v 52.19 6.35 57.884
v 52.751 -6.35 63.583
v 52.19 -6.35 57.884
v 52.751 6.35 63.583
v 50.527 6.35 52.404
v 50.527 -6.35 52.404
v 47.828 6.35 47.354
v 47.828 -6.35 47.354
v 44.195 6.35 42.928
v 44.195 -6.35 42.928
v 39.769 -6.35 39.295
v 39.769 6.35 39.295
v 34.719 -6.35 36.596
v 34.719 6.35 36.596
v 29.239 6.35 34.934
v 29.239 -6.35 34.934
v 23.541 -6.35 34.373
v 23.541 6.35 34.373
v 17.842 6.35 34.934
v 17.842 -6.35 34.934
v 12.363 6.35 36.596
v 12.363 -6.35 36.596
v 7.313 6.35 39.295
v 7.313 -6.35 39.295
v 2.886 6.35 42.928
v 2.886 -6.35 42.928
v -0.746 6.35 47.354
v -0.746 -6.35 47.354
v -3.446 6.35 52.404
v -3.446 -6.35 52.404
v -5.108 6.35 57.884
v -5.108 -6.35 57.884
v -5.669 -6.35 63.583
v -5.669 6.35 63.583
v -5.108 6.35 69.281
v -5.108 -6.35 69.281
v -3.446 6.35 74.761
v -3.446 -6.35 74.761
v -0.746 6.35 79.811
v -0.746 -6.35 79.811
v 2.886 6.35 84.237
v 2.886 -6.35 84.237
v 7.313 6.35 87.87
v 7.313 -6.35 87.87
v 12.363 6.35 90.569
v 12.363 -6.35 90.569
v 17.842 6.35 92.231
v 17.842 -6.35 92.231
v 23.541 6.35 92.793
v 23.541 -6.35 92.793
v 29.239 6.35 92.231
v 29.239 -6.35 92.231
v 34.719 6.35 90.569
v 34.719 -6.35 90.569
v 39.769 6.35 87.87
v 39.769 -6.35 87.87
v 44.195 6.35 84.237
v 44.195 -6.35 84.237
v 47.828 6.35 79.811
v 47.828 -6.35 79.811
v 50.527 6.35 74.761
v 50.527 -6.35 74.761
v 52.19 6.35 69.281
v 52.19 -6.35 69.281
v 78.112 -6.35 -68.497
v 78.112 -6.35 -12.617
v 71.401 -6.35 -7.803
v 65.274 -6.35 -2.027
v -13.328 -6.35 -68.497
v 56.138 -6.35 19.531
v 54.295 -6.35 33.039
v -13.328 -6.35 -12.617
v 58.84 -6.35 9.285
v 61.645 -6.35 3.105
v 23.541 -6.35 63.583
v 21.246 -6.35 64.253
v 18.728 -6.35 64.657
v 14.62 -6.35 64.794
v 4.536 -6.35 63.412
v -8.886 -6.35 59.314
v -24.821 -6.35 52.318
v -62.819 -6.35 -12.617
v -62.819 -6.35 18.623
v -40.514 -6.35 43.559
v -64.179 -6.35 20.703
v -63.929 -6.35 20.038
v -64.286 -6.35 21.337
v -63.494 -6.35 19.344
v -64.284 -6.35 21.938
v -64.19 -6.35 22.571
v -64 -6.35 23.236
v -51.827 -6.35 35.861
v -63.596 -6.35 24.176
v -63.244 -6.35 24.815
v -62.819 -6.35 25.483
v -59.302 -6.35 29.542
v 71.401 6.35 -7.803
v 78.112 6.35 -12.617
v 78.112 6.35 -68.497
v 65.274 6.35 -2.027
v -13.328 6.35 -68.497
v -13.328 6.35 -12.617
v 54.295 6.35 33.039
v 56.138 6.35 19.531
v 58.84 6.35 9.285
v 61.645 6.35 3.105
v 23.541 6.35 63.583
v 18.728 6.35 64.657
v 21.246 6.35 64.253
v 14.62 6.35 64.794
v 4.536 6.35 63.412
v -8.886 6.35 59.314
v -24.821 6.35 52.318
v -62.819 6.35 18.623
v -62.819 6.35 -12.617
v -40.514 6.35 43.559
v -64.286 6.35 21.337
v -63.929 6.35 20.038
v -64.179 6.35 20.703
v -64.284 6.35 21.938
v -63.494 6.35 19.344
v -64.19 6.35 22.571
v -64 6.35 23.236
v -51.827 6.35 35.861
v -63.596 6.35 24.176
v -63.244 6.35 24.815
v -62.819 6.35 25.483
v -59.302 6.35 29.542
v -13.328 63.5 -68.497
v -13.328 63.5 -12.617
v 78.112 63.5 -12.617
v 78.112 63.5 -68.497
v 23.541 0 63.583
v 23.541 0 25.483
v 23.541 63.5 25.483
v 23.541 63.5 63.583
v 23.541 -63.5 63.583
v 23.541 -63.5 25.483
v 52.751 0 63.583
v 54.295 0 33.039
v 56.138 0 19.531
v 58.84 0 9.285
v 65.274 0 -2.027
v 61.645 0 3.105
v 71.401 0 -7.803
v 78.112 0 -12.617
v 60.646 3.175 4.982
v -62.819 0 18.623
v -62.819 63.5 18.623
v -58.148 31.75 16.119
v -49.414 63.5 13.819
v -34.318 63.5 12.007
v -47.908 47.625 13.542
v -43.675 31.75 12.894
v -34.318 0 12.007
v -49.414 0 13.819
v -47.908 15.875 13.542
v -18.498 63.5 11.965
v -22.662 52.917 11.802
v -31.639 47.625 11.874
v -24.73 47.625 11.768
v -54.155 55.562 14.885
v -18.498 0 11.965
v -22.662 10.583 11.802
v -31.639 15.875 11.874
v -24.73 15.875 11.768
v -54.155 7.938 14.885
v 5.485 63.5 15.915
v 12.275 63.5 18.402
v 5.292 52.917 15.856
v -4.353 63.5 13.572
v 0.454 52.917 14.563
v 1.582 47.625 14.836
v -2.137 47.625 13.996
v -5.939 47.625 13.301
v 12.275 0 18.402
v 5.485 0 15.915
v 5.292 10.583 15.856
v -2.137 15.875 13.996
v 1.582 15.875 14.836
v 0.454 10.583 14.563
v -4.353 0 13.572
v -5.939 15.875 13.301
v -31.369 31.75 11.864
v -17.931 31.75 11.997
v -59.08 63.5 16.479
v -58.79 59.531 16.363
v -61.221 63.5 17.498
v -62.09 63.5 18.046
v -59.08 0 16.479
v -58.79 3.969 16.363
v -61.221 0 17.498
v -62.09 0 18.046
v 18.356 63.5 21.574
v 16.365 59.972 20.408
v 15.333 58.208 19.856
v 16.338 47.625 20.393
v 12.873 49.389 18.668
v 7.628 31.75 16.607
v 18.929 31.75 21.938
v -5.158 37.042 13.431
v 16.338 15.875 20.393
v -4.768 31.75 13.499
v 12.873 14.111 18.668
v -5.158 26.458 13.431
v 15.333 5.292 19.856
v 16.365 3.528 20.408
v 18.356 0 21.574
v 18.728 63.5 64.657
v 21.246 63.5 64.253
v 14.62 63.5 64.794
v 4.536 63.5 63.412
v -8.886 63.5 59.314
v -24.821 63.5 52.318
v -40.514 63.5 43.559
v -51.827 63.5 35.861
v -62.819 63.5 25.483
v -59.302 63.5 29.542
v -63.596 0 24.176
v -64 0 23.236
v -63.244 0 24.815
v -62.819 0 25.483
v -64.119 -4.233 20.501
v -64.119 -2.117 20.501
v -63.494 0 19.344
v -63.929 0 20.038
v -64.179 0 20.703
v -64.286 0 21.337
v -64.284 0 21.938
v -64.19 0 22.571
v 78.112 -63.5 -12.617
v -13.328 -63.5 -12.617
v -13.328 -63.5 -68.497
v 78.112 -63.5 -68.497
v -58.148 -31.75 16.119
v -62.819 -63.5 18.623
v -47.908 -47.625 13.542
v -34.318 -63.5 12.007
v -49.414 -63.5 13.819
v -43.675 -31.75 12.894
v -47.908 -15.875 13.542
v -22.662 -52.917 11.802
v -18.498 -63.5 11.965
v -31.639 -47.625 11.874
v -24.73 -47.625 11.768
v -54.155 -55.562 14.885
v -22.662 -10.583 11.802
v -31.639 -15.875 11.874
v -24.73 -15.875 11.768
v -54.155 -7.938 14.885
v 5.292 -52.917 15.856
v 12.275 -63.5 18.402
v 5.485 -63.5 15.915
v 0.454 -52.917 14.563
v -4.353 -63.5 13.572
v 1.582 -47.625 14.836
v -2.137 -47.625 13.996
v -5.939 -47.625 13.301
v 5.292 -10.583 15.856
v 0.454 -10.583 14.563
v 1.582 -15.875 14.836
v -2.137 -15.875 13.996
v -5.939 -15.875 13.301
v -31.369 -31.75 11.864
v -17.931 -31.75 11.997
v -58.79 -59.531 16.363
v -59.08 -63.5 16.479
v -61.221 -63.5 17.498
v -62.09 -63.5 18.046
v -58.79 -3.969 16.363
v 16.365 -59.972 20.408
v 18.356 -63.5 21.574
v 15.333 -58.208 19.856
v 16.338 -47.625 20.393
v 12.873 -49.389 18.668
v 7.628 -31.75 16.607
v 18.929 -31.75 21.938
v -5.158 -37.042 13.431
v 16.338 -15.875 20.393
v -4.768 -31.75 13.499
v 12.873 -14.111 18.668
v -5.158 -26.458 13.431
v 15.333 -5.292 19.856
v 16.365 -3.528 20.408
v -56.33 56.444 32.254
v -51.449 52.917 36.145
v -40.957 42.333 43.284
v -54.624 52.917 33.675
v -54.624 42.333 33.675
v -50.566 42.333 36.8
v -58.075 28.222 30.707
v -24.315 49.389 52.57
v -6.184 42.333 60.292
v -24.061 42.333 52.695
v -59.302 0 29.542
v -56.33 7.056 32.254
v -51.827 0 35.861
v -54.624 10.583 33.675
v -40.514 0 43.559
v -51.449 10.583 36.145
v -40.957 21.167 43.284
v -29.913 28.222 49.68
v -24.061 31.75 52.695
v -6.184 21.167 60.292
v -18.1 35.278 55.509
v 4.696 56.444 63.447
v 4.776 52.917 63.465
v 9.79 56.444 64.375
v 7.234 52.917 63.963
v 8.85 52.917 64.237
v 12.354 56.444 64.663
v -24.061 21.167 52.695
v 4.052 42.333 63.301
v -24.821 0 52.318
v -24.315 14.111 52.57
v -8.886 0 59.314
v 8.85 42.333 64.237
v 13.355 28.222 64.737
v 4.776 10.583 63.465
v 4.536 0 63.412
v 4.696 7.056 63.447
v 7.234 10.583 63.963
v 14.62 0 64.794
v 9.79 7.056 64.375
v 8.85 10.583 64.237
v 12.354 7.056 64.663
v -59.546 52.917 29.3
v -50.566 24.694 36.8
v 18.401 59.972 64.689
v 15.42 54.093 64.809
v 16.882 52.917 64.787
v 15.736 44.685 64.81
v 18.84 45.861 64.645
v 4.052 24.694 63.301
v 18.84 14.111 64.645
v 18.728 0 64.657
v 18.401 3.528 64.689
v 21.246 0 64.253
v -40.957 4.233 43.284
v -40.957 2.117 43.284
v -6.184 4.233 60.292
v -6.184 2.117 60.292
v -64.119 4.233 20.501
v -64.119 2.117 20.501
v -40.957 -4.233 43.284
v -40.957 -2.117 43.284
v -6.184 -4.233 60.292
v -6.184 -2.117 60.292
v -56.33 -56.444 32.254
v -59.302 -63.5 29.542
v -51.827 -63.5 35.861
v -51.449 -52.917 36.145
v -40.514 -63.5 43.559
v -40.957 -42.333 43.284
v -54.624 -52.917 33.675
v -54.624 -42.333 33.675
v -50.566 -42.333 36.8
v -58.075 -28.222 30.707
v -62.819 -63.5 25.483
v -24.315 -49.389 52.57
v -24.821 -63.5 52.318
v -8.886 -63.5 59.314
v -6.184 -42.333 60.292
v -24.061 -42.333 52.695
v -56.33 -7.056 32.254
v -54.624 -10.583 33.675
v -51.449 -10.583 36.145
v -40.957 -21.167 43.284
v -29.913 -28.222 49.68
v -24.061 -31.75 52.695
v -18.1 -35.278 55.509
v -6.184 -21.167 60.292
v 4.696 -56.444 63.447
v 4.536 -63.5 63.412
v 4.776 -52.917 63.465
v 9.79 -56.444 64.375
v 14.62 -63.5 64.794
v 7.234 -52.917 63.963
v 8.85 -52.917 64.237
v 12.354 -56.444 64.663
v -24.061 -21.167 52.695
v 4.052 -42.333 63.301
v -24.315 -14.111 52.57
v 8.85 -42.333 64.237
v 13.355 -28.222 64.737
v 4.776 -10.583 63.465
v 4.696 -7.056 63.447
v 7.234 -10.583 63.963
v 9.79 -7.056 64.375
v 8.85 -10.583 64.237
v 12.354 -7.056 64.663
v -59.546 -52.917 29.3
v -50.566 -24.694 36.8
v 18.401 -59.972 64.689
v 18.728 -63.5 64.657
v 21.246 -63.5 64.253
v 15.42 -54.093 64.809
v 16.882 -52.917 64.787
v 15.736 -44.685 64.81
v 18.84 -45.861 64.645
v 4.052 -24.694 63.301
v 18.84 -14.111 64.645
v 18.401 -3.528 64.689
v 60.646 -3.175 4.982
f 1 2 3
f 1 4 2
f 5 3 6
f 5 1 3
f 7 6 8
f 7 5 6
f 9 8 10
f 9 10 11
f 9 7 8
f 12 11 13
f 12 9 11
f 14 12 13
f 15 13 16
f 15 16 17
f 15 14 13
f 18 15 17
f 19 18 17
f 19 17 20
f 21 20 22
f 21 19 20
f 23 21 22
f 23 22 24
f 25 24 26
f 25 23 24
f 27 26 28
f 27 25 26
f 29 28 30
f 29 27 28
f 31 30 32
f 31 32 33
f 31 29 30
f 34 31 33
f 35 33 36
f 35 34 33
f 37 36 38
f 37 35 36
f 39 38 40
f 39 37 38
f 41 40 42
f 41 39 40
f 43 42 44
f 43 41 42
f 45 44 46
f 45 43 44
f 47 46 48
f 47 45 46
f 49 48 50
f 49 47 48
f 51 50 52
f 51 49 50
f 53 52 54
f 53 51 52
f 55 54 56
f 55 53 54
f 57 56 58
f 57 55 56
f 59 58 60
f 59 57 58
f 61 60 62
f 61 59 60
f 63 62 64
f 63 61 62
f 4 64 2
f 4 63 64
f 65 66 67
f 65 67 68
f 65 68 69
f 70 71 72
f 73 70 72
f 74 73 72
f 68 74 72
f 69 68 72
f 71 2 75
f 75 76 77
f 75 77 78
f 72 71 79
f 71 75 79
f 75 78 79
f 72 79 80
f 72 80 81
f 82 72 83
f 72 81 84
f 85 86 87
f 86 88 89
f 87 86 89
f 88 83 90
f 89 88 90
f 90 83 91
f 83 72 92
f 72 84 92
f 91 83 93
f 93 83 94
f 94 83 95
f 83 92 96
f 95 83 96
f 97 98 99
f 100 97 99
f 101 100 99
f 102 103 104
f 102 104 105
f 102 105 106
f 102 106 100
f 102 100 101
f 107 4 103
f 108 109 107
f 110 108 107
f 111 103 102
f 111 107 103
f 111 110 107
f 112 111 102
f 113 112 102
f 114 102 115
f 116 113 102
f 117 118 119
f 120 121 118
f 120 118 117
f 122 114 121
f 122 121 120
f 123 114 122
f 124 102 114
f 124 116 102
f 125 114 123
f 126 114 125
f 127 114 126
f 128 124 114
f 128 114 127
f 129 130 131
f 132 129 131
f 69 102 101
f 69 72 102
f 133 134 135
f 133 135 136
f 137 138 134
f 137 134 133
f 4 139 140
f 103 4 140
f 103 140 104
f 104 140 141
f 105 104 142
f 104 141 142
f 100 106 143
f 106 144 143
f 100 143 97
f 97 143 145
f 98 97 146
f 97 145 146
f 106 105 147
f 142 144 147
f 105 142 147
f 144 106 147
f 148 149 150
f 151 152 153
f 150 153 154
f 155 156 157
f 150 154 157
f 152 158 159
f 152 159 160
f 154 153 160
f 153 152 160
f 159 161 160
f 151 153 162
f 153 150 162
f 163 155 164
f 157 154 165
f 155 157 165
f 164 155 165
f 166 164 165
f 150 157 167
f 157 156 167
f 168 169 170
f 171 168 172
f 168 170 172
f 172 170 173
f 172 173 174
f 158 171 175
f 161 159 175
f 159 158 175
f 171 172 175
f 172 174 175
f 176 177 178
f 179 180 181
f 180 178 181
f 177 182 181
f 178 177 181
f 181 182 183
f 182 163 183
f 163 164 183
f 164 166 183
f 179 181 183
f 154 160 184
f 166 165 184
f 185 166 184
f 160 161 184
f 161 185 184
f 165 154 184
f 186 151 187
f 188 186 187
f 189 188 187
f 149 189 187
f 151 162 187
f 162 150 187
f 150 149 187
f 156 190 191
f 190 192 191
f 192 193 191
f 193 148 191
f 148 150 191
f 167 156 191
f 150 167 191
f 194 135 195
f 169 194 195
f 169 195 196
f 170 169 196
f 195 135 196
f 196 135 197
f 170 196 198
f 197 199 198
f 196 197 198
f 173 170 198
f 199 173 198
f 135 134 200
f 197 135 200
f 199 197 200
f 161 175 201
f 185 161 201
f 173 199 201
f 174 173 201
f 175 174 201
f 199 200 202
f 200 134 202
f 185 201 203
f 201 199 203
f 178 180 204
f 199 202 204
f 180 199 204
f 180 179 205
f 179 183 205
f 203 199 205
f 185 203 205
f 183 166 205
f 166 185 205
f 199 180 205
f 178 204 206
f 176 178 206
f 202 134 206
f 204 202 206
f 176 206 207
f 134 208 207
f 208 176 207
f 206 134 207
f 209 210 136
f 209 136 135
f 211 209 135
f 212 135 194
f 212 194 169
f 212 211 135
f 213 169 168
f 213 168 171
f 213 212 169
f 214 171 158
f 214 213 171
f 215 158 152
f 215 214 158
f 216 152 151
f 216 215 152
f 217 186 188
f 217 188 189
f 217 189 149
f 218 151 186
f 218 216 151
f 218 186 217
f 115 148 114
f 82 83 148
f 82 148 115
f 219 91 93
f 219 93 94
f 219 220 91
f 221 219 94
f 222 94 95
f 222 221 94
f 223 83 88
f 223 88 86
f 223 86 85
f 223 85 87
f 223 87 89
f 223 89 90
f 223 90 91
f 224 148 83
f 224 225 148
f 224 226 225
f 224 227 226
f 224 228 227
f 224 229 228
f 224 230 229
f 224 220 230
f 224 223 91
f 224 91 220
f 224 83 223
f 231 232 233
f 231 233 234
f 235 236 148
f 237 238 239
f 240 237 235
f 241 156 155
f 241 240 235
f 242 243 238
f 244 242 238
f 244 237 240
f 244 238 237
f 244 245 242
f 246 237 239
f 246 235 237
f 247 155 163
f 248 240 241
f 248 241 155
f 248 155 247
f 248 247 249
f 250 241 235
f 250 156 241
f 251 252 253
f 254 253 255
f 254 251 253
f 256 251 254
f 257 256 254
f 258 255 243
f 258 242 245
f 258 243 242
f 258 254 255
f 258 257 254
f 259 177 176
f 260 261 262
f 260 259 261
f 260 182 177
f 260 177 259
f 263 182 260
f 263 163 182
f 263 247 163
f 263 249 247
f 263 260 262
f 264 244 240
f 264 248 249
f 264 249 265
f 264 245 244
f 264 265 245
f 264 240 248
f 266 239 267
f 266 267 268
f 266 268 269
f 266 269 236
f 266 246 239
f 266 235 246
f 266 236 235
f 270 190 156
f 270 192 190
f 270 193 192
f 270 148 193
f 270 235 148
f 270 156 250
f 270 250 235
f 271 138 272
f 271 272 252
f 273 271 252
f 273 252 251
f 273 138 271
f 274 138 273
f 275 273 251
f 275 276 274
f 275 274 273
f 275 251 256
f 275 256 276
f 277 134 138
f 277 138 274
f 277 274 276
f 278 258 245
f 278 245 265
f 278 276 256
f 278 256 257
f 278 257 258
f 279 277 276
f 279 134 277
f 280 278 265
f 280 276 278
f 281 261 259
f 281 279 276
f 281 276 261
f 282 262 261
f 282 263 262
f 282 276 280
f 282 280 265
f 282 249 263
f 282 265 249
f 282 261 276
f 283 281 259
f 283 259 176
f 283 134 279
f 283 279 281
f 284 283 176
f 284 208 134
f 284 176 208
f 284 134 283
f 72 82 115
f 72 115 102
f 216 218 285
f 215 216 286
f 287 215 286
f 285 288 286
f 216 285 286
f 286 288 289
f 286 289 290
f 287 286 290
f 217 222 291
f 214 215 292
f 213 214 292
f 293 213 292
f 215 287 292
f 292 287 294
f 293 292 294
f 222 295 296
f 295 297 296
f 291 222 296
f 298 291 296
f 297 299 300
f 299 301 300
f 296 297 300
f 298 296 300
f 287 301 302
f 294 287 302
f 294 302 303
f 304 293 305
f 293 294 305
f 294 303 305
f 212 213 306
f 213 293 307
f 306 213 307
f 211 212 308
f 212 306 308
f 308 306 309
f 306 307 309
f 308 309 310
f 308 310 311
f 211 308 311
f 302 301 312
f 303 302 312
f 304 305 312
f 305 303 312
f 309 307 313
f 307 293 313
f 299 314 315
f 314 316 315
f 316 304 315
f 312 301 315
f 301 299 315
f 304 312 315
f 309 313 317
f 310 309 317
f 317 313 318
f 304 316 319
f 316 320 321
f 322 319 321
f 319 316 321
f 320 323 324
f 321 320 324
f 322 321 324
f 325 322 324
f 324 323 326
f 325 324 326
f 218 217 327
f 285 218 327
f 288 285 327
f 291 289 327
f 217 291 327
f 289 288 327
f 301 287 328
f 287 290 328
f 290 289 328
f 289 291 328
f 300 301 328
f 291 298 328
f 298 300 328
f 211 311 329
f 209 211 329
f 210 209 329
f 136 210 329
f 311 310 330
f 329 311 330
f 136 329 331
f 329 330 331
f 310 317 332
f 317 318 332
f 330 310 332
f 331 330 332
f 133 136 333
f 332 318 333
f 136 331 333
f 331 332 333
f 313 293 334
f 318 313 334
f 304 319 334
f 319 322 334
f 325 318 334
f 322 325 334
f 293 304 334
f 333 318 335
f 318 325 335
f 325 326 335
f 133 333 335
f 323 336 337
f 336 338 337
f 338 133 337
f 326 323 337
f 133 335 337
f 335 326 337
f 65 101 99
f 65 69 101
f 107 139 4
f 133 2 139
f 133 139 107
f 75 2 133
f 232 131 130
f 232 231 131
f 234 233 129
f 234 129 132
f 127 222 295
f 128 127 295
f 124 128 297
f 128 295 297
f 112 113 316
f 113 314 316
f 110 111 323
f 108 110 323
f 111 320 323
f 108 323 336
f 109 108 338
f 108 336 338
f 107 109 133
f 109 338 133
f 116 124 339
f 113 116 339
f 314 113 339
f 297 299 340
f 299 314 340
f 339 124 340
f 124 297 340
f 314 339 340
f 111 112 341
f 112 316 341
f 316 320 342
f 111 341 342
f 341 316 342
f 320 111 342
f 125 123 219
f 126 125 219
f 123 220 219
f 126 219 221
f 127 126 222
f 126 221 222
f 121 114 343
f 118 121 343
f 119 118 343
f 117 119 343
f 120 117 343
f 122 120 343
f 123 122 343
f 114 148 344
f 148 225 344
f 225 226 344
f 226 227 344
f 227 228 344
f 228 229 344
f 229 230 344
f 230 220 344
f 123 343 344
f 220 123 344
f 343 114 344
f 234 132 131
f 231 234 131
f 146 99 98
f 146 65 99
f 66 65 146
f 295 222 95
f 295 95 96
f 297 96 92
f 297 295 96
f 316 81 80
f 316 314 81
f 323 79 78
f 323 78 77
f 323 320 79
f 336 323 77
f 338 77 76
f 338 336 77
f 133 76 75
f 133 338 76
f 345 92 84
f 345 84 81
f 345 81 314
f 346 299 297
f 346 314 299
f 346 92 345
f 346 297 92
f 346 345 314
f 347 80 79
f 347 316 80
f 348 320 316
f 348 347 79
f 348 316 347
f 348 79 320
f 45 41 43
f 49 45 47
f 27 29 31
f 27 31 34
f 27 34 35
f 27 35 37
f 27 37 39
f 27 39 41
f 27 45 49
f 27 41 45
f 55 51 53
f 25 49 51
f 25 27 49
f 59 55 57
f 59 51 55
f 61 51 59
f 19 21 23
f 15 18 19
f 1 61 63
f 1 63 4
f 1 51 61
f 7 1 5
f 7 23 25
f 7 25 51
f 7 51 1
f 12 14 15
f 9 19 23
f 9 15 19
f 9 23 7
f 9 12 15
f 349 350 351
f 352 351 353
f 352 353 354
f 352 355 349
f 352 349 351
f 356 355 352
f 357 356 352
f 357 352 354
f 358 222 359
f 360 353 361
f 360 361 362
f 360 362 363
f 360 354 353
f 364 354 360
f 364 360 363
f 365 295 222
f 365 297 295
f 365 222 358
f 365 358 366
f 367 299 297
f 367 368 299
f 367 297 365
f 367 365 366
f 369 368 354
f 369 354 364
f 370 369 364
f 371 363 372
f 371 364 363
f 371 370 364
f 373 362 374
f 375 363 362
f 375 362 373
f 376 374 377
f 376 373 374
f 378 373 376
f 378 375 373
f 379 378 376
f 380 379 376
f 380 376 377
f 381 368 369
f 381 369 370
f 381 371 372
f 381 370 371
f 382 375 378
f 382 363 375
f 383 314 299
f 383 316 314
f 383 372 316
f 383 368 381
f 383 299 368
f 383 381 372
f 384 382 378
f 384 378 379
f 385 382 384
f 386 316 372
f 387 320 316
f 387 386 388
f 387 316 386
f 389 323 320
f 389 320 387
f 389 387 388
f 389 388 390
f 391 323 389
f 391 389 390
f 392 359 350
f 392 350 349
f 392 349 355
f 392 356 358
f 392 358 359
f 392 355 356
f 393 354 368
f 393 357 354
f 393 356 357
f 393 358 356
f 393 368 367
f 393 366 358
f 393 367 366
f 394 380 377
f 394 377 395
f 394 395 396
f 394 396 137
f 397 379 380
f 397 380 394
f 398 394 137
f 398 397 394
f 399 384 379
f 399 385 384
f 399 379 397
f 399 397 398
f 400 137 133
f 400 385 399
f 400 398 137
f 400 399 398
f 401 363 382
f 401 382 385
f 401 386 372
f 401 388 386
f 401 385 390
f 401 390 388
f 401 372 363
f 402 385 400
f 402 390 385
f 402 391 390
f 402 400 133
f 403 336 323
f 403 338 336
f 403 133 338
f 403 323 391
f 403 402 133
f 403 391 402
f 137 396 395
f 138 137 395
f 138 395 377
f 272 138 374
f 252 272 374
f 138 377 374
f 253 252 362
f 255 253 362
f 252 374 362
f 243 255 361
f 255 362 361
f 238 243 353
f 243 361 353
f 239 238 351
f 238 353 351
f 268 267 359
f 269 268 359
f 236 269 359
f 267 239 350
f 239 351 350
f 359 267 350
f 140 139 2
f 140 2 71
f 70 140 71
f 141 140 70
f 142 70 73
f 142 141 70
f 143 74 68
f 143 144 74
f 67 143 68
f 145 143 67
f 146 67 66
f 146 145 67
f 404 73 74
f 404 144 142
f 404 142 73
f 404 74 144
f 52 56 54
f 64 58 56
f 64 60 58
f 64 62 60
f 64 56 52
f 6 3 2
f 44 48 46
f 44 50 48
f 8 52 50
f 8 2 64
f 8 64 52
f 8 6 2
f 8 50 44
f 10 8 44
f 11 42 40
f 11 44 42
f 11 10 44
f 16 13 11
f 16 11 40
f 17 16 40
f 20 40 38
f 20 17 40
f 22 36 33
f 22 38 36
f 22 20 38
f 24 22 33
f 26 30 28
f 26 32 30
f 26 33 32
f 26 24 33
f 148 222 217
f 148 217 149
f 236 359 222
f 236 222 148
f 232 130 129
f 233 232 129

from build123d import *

# Parameters (mm, degrees)
F1_DEPTH = 63.5
F2_DEPTH = 6.35


with BuildPart() as f1:
    # F0 (on Front) → F1 (new body, symmetric)
    with BuildSketch(Plane.XZ):
        with BuildLine():
            add(Edge.make_bspline(
                [(-62.8191306663, 25.4825032473), (-53.3984235242, 39.3724645125), (2.3272637423, 71.4595154464), (23.5408693337, 63.5825032473)],
                knots=[0, 0, 0, 0, 0.3446371565, 0.3446371565, 0.3446371565, 0.3446371565], degree=3))
            Line((-62.8191306663, 25.4825032473), (23.5408693337, 25.4825032473))
            Line((23.5408693337, 25.4825032473), (23.5408693337, 63.5825032473))
        make_face()
        with BuildLine():
            Line((23.5408693337, 25.4825032473), (-62.8191306663, 25.4825032473))
            Line((-62.8191306663, 25.4825032473), (-62.8191306663, 18.6229422223))
            add(Edge.make_bspline(
                [(23.5408693337, 25.4825032473), (4.4069734926, 7.9127626337), (-47.6861862114, 10.4262042613), (-61.7764711631, 17.683755635), (-62.8191306663, 18.6229422223)],
                knots=[0.5635943956, 0.5635943956, 0.5635943956, 0.5635943956, 0.8852532886, 0.9257726642, 0.9257726642, 0.9257726642, 0.9257726642], degree=3))
        make_face()
    extrude(amount=F1_DEPTH, both=True)


with BuildPart() as f1b:
    # F0 (on Front) → F1, piece 2 (new body, symmetric)
    with BuildSketch(Plane.XZ):
        Polygon((52.7508693337, -12.6174967527), (23.5408693337, -12.6174967527), (-13.328413029, -12.6174967527), (-13.328413029, -68.4974967527), (78.111586971, -68.4974967527), (78.111586971, -12.6174967527), align=None)
    extrude(amount=F1_DEPTH, both=True)


with BuildPart() as f2:
    # F0 (on Front) → F2 (new body, symmetric)
    with BuildSketch(Plane.XZ):
        with BuildLine():
            add(Edge.make_bspline(
                [(-62.8191306663, 25.4825032473), (-53.3984235242, 39.3724645125), (2.3272637423, 71.4595154464), (23.5408693337, 63.5825032473)],
                knots=[0, 0, 0, 0, 0.3446371565, 0.3446371565, 0.3446371565, 0.3446371565], degree=3))
            Line((-62.8191306663, 25.4825032473), (23.5408693337, 25.4825032473))
            Line((23.5408693337, 25.4825032473), (23.5408693337, 63.5825032473))
        make_face()
        with BuildLine():
            Line((23.5408693337, 25.4825032473), (-62.8191306663, 25.4825032473))
            Line((-62.8191306663, 25.4825032473), (-62.8191306663, 18.6229422223))
            add(Edge.make_bspline(
                [(23.5408693337, 25.4825032473), (4.4069734926, 7.9127626337), (-47.6861862114, 10.4262042613), (-61.7764711631, 17.683755635), (-62.8191306663, 18.6229422223)],
                knots=[0.5635943956, 0.5635943956, 0.5635943956, 0.5635943956, 0.8852532886, 0.9257726642, 0.9257726642, 0.9257726642, 0.9257726642], degree=3))
        make_face()
        with BuildLine():
            Line((-62.8191306663, 18.6229422223), (-62.8191306663, 25.4825032473))
            add(Edge.make_bspline(
                [(-62.8191306663, 18.6229422223), (-64.7291758198, 20.3434356182), (-64.8481457602, 22.4909081753), (-62.8191306663, 25.4825032473)],
                knots=[0.9257726642, 0.9257726642, 0.9257726642, 0.9257726642, 1, 1, 1, 1], degree=3))
        make_face()
        with BuildLine():
            add(Edge.make_bspline(
                [(23.5408693337, 63.5825032473), (37.0184425553, 58.578025898), (36.5655520002, 37.44244585), (23.5408693337, 25.4825032473)],
                knots=[0.3446371565, 0.3446371565, 0.3446371565, 0.3446371565, 0.5635943956, 0.5635943956, 0.5635943956, 0.5635943956], degree=3))
            Line((23.5408693337, 25.4825032473), (23.5408693337, -12.6174967527))
            Line((23.5408693337, -12.6174967527), (52.7508693337, -12.6174967527))
            Line((52.7508693337, -12.6174967527), (52.7508693337, 63.5825032473))
            Line((52.7508693337, 63.5825032473), (23.5408693337, 63.5825032473))
        make_face()
        with BuildLine():
            Line((23.5408693337, 63.5825032473), (23.5408693337, 25.4825032473))
            add(Edge.make_bspline(
                [(23.5408693337, 63.5825032473), (37.0184425553, 58.578025898), (36.5655520002, 37.44244585), (23.5408693337, 25.4825032473)],
                knots=[0.3446371565, 0.3446371565, 0.3446371565, 0.3446371565, 0.5635943956, 0.5635943956, 0.5635943956, 0.5635943956], degree=3))
        make_face()
        with BuildLine():
            Line((23.5408693337, -12.6174967527), (23.5408693337, 25.4825032473))
            add(Edge.make_bspline(
                [(23.5408693337, 25.4825032473), (4.4069734926, 7.9127626337), (-47.6861862114, 10.4262042613), (-61.7764711631, 17.683755635), (-62.8191306663, 18.6229422223)],
                knots=[0.5635943956, 0.5635943956, 0.5635943956, 0.5635943956, 0.8852532886, 0.9257726642, 0.9257726642, 0.9257726642, 0.9257726642], degree=3))
            Line((-62.8191306663, 18.6229422223), (-62.8191306663, -12.6174967527))
            Line((-62.8191306663, -12.6174967527), (-13.328413029, -12.6174967527))
            Line((-13.328413029, -12.6174967527), (23.5408693337, -12.6174967527))
        make_face()
        Polygon((52.7508693337, -12.6174967527), (23.5408693337, -12.6174967527), (-13.328413029, -12.6174967527), (-13.328413029, -68.4974967527), (78.111586971, -68.4974967527), (78.111586971, -12.6174967527), align=None)
        with BuildLine():
            add(Edge.make_bspline(
                [(52.7508693337, 63.5825032473), (53.4527266053, 40.8705029879), (54.6090808037, 3.4510476137), (71.4804236947, -8.0838040244), (78.111586971, -12.6174967527)],
                knots=[0, 0, 0, 0, 0.6069569969, 1, 1, 1, 1], degree=3))
            Line((52.7508693337, 63.5825032473), (52.7508693337, -12.6174967527))
            Line((52.7508693337, -12.6174967527), (78.111586971, -12.6174967527))
        make_face()
    extrude(amount=F2_DEPTH, both=True)


with BuildPart() as f3:
    # F2_face (on face) → F3 (revolve)
    with BuildSketch(Plane(origin=(38.1458693337, 0, 63.5825032473), x_dir=(1, 0, 0), z_dir=(0, 0, 1))):
        Polygon((14.605, 0), (14.605, 6.35), (-14.605, 6.35), (-14.605, 0), (-14.605, -6.35), (14.605, -6.35), align=None)
    revolve(axis=Axis((23.5408693337, 0, 63.5825032473), (0, 1, 0)))


solid = Compound([f1.part, f1b.part, f2.part, f3.part])
